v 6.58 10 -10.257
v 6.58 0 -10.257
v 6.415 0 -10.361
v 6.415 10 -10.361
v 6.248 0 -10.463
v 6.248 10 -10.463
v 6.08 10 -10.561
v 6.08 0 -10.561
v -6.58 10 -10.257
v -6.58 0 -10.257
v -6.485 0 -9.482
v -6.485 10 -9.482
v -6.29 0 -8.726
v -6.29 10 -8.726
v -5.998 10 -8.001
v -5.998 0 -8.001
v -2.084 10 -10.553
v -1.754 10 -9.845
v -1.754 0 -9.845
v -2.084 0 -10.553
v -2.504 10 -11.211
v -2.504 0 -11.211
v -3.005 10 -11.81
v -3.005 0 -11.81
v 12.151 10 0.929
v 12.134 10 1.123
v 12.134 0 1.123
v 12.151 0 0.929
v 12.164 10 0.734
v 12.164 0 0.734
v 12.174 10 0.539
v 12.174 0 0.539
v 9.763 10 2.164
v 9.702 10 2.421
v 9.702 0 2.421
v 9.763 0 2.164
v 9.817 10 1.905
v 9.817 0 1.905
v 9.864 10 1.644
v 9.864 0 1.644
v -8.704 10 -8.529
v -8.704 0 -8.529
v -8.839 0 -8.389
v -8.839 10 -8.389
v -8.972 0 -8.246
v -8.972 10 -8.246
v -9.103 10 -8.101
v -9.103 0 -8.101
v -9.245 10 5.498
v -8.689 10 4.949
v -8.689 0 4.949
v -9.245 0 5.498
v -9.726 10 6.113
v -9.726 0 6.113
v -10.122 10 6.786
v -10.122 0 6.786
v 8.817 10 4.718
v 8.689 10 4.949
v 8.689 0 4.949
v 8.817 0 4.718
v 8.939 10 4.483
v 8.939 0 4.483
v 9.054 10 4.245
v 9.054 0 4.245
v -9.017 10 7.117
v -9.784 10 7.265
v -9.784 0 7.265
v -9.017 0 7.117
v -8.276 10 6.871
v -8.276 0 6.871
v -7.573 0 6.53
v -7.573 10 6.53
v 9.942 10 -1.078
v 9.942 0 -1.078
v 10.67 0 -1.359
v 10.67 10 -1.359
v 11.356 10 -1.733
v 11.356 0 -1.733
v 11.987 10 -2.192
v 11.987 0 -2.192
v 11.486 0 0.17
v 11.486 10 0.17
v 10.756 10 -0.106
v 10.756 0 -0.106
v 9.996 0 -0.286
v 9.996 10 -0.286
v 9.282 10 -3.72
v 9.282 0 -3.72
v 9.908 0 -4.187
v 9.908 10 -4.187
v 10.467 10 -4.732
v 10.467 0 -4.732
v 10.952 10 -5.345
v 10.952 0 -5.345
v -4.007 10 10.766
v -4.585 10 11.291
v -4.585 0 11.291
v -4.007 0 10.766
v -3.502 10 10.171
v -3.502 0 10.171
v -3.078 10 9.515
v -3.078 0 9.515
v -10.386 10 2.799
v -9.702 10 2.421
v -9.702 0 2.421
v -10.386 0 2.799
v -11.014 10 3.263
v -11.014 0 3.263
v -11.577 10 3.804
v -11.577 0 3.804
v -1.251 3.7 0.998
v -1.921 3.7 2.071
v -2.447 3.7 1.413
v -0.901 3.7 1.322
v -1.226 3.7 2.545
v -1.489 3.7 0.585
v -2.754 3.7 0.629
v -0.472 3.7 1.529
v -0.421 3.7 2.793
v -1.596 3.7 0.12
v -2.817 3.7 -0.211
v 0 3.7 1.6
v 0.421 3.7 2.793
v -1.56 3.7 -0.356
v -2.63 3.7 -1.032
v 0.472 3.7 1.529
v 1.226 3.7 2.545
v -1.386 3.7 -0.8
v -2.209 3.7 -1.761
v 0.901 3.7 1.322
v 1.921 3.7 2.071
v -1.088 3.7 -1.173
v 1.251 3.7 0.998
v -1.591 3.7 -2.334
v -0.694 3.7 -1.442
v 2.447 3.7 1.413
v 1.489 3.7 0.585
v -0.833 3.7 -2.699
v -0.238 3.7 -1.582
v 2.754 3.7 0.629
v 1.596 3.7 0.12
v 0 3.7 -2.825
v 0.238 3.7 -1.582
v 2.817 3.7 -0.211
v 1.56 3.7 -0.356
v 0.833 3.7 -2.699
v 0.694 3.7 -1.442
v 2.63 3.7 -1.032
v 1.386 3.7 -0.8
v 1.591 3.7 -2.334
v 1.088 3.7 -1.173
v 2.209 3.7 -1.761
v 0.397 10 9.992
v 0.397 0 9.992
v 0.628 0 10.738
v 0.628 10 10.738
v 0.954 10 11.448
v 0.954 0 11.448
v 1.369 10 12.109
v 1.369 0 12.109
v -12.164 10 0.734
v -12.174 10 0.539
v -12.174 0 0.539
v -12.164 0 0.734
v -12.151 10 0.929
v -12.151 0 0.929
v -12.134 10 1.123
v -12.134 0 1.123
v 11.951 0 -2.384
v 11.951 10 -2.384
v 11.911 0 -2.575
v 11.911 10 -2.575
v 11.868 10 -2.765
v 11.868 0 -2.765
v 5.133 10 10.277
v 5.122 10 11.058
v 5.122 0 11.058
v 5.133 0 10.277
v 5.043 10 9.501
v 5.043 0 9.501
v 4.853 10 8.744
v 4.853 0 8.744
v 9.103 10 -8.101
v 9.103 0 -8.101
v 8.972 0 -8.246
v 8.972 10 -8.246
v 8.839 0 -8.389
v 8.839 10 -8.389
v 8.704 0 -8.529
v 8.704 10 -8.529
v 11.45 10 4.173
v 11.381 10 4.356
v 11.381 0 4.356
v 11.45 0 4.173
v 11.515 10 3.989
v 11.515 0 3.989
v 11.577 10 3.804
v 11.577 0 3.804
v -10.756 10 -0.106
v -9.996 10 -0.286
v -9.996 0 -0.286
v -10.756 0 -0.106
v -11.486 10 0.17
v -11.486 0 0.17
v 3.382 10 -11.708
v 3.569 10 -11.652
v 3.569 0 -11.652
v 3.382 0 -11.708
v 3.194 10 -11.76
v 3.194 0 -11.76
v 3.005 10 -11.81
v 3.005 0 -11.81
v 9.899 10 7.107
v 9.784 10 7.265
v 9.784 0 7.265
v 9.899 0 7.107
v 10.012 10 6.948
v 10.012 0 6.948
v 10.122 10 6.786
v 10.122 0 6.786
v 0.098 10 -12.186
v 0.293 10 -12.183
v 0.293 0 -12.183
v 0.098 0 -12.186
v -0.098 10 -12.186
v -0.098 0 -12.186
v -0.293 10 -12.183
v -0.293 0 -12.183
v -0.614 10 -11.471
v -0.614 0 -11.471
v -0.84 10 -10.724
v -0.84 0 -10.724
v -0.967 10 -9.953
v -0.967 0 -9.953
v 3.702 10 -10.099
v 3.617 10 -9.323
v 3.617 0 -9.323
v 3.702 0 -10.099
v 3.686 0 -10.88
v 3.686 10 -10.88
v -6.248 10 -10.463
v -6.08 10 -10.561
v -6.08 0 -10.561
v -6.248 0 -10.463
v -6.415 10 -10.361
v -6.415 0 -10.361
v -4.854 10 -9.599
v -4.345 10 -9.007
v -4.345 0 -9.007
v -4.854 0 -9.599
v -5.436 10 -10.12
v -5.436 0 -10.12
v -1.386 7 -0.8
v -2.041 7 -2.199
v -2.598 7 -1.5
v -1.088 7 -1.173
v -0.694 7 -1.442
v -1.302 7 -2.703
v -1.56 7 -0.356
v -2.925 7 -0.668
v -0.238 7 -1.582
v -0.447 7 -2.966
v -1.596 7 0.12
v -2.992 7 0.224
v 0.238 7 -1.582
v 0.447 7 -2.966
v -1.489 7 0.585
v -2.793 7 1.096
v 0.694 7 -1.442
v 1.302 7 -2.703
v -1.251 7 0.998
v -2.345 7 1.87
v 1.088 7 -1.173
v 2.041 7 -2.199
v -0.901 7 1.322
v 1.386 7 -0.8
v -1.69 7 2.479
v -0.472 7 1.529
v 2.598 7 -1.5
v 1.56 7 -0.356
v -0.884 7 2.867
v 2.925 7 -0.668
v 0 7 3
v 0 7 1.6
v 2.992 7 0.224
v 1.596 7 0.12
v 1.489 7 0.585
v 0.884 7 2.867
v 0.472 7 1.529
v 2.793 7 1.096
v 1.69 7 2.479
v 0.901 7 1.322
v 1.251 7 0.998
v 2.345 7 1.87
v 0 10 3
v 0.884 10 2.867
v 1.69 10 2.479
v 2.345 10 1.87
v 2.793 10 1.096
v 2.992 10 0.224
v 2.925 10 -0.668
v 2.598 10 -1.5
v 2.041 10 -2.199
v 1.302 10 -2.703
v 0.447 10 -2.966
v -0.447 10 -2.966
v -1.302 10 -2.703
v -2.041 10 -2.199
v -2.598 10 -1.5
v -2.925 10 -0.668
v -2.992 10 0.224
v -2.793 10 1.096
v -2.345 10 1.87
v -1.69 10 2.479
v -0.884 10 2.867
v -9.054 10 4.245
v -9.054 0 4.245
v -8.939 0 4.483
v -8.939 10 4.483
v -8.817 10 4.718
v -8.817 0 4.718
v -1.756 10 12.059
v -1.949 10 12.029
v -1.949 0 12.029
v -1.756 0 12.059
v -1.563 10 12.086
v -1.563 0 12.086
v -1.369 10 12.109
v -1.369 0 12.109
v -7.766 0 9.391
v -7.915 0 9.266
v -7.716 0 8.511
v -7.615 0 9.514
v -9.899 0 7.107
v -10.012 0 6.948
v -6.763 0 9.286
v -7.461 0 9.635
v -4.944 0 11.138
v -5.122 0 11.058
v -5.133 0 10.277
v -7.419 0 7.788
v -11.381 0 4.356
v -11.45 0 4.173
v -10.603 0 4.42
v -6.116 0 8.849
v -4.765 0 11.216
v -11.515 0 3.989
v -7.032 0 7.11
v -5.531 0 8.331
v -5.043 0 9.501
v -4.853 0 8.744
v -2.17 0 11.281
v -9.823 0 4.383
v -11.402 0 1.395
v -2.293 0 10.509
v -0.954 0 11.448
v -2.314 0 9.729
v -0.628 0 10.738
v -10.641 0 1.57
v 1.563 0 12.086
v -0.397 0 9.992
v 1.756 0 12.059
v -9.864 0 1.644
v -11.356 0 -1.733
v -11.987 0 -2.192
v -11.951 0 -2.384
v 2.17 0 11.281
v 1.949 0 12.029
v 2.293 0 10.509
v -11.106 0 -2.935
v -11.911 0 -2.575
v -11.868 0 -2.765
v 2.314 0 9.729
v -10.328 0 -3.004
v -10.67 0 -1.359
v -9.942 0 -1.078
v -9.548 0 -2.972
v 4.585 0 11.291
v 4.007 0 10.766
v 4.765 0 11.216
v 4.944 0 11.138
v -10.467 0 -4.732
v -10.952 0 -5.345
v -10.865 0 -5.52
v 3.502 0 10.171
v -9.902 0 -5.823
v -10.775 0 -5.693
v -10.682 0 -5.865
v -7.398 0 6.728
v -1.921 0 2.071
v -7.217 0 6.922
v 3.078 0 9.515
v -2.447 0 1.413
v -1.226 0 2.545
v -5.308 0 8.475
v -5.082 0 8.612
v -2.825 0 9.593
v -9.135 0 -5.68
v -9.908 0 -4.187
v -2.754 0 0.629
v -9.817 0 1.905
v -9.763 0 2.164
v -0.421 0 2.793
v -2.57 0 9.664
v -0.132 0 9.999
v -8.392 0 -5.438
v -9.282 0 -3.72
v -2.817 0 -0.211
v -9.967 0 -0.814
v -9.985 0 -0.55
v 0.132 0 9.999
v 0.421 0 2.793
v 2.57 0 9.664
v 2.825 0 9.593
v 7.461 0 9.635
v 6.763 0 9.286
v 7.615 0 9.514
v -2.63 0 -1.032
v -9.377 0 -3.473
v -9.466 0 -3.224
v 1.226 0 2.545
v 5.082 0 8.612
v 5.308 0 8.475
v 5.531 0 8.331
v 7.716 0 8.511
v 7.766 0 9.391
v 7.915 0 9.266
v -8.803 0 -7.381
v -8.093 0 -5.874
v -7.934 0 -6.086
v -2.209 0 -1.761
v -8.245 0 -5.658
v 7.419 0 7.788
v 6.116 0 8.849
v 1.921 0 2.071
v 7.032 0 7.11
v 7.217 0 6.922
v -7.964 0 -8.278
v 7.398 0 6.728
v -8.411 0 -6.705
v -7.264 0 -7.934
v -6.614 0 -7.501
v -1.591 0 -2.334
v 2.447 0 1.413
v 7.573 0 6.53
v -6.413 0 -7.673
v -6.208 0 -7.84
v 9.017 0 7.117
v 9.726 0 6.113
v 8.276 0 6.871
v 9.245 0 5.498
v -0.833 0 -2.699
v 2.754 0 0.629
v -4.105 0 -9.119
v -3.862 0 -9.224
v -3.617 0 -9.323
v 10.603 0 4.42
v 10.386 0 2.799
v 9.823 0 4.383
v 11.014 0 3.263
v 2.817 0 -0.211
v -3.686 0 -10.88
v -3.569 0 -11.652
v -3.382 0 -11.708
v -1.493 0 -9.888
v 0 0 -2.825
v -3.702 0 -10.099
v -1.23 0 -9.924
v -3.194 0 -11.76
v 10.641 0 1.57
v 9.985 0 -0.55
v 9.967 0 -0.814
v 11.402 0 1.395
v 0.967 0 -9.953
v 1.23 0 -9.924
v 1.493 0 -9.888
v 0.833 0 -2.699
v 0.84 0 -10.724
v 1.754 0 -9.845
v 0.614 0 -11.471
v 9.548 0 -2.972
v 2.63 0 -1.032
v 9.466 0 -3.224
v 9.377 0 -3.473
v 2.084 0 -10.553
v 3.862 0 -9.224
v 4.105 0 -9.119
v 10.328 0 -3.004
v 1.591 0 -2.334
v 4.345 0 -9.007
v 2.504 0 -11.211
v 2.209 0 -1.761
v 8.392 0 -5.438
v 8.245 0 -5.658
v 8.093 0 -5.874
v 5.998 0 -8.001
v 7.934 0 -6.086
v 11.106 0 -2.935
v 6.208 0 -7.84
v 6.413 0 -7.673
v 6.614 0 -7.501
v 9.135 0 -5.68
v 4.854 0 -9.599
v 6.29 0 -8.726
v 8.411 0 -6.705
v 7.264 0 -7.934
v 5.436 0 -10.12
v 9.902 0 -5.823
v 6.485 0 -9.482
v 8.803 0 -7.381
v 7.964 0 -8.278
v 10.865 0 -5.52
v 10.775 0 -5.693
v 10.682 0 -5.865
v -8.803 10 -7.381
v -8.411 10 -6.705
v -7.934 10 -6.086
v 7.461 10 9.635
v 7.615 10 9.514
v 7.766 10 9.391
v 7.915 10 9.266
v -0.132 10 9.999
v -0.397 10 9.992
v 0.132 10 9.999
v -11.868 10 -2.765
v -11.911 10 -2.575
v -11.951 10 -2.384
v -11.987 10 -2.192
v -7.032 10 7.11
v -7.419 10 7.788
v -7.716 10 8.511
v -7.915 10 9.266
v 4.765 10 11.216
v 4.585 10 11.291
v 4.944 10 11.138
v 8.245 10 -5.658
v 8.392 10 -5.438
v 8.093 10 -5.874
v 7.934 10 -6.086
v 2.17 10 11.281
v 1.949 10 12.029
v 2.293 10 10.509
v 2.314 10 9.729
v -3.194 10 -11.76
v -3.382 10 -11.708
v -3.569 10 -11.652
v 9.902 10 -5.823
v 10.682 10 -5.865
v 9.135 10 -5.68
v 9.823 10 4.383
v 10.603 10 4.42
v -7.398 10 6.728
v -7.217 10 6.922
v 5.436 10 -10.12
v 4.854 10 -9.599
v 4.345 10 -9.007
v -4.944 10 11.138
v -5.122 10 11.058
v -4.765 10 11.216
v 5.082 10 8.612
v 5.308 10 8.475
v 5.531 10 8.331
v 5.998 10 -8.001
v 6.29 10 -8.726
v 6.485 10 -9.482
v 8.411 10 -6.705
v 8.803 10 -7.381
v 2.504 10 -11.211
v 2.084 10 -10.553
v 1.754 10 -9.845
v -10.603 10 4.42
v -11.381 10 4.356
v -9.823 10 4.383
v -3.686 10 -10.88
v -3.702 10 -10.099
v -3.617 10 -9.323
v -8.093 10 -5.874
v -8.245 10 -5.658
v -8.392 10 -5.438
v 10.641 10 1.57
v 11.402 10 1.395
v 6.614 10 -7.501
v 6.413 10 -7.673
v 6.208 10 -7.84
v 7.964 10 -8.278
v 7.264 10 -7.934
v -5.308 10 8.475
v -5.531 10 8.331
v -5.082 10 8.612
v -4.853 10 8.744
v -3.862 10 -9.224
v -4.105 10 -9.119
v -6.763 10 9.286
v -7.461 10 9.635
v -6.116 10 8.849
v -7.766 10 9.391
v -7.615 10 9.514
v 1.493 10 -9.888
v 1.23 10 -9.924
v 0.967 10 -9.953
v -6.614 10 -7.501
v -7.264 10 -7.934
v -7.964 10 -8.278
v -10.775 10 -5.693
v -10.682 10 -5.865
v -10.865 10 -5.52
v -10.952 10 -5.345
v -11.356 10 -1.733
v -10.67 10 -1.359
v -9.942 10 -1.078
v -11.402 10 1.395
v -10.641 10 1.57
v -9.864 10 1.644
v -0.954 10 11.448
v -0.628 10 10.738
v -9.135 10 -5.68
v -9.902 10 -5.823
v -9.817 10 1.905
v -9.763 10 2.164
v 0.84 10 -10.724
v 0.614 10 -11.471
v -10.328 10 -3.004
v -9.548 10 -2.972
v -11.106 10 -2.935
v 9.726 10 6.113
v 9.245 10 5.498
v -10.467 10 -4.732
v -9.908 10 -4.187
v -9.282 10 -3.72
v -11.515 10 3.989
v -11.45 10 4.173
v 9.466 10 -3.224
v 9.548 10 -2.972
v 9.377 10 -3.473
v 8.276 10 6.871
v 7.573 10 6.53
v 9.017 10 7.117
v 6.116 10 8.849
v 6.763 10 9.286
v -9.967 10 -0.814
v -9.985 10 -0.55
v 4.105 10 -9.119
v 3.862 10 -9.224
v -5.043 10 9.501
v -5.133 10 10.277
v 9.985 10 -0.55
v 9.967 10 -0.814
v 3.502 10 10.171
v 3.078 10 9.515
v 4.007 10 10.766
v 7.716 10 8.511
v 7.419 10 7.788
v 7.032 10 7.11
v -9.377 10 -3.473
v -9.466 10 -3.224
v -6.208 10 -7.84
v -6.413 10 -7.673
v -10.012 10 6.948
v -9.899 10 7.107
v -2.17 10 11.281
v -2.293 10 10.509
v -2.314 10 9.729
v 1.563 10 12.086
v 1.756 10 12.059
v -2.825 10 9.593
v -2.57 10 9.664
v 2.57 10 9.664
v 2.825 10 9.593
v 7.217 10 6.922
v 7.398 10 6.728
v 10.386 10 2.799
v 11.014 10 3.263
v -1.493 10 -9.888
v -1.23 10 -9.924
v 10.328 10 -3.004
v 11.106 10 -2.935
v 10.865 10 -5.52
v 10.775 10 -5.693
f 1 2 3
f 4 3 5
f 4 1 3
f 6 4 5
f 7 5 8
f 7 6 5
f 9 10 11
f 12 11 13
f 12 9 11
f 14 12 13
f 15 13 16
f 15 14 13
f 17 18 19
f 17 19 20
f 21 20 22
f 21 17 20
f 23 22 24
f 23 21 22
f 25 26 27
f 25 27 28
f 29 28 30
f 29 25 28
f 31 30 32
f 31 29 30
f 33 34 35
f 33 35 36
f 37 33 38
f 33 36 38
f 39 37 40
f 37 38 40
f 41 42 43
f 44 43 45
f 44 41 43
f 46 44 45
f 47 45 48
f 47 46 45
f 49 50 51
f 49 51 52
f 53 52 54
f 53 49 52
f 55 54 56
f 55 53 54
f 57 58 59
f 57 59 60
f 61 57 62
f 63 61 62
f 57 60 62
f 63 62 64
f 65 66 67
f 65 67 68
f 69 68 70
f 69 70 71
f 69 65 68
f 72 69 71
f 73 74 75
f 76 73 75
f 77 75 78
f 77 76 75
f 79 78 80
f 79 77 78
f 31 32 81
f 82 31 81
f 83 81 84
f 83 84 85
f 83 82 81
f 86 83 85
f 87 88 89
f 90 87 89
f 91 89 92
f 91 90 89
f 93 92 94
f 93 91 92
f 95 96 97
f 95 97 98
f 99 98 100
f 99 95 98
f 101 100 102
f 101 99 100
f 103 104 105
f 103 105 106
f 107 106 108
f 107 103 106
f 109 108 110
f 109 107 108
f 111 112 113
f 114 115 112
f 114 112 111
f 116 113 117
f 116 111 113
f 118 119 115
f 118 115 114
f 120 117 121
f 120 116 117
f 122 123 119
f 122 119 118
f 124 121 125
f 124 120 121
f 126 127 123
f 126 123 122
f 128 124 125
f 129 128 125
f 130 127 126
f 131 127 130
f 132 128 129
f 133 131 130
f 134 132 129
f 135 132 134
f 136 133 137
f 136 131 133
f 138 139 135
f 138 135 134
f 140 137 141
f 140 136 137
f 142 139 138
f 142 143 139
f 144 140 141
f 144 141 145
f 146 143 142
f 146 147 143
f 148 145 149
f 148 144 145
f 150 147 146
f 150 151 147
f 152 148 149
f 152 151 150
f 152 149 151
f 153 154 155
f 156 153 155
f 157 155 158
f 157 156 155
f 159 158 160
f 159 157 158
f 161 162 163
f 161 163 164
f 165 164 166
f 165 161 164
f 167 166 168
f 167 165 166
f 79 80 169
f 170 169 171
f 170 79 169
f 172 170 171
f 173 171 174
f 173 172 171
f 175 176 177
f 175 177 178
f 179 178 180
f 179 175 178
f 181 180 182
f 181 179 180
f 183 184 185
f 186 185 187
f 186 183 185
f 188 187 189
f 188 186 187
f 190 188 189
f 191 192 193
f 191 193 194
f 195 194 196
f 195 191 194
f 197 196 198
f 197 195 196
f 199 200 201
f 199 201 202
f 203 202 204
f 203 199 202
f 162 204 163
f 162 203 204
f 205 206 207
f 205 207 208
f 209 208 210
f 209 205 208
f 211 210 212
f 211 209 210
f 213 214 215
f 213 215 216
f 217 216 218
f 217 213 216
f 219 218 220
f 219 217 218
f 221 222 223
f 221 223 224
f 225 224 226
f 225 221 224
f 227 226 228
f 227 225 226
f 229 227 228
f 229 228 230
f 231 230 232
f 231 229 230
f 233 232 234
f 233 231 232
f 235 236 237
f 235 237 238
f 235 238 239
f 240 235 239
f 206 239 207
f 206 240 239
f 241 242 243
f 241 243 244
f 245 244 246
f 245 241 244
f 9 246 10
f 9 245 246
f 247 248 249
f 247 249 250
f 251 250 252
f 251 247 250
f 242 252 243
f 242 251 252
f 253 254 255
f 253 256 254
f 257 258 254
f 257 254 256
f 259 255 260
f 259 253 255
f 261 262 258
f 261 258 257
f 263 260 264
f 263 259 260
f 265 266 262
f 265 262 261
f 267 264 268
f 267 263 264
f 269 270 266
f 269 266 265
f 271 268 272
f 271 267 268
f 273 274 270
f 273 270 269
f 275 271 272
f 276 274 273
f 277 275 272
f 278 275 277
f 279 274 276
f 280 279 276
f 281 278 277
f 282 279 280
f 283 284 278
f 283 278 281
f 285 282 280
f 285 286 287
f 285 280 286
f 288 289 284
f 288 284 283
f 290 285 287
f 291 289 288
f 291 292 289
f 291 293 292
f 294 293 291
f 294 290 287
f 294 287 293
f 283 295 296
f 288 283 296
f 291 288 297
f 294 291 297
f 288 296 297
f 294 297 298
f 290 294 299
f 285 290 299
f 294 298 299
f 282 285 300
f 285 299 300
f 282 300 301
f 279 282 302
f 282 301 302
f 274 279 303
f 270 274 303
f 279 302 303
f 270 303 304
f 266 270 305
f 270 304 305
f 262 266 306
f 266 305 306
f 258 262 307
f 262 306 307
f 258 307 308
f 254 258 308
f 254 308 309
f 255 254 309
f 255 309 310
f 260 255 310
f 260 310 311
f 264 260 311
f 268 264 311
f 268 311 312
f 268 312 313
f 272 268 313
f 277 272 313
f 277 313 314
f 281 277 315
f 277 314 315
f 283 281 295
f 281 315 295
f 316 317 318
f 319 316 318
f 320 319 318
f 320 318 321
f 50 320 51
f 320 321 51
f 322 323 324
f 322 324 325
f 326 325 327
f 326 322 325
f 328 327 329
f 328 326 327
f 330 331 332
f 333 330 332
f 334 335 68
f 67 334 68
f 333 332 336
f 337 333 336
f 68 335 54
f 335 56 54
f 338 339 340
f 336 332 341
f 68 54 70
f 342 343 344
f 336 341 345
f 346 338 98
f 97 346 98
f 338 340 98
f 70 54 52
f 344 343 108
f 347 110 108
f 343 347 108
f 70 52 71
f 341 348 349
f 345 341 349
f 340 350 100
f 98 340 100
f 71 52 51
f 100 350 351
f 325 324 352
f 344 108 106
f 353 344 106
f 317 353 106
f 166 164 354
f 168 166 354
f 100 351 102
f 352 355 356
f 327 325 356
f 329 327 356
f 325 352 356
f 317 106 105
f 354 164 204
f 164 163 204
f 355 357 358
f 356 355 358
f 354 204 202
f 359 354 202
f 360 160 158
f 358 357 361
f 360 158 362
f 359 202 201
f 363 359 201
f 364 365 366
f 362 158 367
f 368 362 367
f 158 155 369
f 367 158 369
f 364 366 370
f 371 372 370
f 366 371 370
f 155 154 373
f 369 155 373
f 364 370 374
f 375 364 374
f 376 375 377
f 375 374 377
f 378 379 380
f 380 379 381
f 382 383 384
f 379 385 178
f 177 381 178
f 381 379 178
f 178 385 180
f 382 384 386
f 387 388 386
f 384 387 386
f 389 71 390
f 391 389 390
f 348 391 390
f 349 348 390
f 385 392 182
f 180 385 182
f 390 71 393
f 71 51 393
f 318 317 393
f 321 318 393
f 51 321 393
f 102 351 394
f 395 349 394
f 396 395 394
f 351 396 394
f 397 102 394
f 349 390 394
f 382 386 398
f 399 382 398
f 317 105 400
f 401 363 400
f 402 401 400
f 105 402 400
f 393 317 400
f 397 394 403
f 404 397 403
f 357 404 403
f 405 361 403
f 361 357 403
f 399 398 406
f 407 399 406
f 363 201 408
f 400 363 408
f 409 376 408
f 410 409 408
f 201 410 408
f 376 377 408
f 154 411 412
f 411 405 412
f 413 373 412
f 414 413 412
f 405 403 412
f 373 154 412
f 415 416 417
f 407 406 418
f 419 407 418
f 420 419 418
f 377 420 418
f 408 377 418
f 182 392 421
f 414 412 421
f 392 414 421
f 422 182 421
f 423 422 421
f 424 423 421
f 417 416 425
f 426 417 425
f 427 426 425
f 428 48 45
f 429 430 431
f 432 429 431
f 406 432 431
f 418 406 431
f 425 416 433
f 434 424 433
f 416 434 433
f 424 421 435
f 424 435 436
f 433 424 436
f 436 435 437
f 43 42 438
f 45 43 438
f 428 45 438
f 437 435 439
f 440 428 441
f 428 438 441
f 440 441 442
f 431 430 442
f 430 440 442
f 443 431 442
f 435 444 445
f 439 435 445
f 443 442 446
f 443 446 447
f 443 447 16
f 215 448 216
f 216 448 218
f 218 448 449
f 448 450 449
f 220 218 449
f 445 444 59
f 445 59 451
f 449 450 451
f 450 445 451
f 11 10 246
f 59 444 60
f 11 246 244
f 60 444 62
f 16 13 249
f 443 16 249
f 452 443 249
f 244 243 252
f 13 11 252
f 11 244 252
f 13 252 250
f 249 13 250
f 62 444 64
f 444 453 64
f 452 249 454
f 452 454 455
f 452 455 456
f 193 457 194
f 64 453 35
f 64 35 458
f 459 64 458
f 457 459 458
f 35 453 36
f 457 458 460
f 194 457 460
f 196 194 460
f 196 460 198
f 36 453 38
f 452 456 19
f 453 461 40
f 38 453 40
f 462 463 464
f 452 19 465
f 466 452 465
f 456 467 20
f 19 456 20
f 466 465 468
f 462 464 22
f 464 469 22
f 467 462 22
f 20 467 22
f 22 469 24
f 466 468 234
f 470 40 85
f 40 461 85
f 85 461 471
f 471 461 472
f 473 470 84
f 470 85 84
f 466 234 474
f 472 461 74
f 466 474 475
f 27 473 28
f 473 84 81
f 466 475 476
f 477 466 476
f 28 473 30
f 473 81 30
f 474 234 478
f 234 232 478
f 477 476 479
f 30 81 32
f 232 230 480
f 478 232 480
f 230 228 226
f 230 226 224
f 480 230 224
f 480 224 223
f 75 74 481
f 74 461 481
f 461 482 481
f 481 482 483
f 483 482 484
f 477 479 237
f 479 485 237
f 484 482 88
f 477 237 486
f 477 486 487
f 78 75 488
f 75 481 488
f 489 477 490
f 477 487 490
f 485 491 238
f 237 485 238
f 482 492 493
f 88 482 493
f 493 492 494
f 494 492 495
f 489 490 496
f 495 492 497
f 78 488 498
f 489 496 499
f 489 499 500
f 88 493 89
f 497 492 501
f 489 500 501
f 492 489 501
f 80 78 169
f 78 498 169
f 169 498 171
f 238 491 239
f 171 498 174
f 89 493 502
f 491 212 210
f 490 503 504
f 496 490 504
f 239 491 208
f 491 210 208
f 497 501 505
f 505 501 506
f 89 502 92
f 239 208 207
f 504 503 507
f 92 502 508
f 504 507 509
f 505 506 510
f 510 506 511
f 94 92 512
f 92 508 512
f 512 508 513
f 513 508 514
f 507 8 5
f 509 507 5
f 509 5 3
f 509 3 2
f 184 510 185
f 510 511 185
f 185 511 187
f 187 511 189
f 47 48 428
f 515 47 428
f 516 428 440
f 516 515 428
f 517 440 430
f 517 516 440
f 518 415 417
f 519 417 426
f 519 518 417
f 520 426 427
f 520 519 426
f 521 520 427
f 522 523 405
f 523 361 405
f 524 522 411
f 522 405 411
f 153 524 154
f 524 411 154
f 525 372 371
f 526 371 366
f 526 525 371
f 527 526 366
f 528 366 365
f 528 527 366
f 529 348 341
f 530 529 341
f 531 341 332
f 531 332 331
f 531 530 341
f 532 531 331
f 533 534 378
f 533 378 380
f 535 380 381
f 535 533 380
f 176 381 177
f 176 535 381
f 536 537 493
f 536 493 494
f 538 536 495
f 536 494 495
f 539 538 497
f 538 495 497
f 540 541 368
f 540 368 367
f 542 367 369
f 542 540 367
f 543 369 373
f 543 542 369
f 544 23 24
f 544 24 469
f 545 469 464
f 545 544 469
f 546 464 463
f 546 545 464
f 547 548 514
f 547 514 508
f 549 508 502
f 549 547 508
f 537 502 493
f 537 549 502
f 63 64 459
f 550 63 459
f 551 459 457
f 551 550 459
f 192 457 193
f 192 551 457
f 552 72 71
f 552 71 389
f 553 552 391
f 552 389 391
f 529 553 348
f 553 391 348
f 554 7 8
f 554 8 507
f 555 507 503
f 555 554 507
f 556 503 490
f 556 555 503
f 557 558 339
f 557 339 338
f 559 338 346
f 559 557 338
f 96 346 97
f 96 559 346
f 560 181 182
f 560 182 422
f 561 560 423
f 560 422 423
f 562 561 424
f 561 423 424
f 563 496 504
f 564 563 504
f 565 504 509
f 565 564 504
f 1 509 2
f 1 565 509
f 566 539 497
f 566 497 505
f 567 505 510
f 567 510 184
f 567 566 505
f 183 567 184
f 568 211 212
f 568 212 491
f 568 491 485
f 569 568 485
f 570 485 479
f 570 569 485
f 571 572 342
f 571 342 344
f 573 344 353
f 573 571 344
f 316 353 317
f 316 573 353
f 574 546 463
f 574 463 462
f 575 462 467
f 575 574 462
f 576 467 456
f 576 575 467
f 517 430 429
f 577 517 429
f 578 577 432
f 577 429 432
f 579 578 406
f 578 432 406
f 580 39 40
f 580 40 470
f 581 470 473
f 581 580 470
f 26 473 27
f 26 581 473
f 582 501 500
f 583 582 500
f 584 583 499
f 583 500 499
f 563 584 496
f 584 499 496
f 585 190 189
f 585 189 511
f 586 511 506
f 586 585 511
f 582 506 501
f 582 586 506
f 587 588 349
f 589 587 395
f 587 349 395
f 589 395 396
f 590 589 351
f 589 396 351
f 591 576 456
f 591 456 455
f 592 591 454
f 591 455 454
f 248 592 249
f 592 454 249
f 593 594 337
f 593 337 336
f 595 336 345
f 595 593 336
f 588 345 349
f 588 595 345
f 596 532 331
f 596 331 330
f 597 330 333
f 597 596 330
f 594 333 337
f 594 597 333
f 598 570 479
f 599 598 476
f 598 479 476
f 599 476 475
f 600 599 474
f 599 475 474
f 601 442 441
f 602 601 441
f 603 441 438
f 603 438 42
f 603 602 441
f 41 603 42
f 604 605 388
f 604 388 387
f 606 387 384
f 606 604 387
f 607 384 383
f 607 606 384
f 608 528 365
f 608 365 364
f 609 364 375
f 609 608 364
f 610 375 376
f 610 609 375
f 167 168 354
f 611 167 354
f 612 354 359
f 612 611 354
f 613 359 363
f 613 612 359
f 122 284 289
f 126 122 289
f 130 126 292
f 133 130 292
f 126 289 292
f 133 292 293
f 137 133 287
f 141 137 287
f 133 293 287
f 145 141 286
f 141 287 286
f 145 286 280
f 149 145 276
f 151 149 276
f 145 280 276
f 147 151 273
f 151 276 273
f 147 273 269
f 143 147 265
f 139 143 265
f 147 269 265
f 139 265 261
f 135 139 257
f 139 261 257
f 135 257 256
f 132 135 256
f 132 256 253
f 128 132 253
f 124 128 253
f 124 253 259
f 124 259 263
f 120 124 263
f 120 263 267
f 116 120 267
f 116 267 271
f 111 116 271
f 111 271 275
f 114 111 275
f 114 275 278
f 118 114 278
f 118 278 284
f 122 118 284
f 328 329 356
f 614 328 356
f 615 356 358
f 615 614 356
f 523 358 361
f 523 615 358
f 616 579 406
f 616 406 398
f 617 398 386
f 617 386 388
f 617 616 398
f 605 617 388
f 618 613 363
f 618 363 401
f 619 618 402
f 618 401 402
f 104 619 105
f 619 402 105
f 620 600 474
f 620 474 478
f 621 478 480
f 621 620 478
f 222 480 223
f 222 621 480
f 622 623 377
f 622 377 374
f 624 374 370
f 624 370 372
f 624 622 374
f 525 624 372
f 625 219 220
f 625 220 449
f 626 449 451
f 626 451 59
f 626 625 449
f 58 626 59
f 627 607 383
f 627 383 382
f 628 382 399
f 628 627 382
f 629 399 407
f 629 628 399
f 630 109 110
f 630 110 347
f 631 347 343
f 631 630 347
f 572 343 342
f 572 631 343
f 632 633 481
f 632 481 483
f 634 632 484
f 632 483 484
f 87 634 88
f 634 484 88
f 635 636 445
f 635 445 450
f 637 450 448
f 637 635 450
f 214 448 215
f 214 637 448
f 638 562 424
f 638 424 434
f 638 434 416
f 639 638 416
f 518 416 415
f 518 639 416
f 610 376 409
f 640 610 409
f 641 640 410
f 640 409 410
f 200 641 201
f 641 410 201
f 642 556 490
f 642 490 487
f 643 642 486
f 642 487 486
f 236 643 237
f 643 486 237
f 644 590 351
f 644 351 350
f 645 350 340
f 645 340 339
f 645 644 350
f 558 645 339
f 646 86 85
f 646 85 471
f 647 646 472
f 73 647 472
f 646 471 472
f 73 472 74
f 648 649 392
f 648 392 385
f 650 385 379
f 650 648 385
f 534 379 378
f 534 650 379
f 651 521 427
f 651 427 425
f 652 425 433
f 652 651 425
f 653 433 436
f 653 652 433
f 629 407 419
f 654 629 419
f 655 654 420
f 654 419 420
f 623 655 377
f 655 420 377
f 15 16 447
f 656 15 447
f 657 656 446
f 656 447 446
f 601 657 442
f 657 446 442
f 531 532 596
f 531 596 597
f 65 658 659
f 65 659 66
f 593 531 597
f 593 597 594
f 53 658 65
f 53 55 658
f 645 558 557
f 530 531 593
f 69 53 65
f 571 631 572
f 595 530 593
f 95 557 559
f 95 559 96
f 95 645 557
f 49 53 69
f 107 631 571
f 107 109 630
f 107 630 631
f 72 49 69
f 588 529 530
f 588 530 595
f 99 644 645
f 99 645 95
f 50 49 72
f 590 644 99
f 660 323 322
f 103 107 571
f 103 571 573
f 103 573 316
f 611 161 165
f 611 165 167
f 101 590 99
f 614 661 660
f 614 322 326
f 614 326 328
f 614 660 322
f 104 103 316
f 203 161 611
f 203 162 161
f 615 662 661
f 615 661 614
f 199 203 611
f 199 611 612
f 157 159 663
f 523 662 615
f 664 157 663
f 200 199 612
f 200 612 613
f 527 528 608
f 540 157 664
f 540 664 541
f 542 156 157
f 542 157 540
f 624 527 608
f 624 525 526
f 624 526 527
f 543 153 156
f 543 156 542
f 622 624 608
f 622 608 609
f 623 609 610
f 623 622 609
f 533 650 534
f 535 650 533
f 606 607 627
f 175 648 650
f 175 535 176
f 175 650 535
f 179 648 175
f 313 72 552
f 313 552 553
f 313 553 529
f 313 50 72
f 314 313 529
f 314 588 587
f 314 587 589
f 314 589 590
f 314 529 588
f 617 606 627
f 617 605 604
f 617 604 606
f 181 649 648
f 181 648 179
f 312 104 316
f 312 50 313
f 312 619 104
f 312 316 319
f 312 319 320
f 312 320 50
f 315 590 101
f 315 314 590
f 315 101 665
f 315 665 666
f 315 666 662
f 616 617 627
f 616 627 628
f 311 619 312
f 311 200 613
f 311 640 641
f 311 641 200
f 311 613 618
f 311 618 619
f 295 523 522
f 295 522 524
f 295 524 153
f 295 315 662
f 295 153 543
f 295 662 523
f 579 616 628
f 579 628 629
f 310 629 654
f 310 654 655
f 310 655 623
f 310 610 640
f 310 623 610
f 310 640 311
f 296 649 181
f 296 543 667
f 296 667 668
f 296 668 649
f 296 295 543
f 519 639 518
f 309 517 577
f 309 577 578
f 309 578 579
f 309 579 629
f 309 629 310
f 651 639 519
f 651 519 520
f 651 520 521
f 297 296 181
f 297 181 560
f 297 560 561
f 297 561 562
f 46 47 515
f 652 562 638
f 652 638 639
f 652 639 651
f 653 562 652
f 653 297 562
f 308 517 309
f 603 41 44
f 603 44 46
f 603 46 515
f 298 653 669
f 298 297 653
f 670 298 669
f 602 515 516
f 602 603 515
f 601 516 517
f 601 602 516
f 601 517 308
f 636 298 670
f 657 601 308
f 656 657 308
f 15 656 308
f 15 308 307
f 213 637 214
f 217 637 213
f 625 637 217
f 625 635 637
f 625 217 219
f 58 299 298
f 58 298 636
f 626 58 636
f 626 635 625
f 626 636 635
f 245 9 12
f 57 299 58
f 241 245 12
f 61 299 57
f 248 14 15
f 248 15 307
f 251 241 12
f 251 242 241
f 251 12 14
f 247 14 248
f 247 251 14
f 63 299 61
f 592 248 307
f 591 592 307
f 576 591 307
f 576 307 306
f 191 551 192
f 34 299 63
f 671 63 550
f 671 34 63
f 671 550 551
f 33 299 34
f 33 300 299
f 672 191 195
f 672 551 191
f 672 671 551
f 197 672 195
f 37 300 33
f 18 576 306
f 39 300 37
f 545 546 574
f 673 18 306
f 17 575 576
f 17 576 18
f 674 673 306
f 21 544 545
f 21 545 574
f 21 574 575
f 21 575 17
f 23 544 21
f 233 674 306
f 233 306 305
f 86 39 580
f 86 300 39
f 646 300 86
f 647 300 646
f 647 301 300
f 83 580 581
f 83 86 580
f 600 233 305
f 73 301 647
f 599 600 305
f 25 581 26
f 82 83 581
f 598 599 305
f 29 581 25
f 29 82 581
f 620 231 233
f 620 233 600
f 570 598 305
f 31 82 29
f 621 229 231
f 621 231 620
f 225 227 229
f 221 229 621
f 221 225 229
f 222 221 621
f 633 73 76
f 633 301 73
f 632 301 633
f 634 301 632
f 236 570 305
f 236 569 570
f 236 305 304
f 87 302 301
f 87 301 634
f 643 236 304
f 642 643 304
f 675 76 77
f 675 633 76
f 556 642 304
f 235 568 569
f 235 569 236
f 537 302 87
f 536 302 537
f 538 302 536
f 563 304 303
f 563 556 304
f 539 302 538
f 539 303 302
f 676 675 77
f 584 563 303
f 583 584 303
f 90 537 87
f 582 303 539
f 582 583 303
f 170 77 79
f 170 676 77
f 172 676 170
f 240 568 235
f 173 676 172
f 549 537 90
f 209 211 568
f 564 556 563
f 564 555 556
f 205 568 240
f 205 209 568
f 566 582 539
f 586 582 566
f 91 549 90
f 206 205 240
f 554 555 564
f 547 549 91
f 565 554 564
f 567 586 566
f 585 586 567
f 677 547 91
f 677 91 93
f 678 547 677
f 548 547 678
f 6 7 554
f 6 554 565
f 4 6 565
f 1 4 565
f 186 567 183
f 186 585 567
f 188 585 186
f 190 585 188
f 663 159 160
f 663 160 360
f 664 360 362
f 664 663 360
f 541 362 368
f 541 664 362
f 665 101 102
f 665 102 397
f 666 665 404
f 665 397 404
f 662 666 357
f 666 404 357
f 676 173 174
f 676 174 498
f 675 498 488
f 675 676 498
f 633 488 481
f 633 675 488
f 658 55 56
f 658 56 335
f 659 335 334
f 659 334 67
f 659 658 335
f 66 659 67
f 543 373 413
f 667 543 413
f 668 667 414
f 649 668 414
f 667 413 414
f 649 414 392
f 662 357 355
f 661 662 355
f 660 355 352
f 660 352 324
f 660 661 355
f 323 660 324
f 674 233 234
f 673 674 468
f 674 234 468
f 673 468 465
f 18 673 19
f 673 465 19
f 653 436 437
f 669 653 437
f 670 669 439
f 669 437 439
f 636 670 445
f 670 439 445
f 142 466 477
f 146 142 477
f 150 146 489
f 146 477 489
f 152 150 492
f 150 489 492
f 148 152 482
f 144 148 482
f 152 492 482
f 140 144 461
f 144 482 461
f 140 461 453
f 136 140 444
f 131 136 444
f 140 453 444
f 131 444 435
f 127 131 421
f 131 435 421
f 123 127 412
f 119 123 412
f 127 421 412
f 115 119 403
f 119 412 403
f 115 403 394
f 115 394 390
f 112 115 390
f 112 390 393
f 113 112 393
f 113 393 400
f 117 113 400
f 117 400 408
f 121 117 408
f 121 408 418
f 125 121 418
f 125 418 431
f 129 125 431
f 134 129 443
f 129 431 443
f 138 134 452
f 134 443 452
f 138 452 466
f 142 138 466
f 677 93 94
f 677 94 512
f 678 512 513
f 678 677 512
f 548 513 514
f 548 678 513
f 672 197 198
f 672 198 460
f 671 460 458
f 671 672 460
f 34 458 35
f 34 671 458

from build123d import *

# Parameters (mm, degrees)
SKETCH1_R           = 10
BOSS_EXTRUDE1_DEPTH = 10
BOSS_EXTRUDE2_DEPTH = 10
SKETCH4_R           = 2.825
CUT_EXTRUDE1_DEPTH  = 3.7
SKETCH5_R           = 1.6
CUT_EXTRUDE2_DEPTH  = 20.917820636
SKETCH7_R           = 3
CUT_EXTRUDE3_DEPTH  = 3


with BuildPart() as part:
    # Sketch1 → Boss-Extrude1 (new body)
    with BuildSketch(Plane(origin=(0, 0, 0), x_dir=(1, 0, 0), z_dir=(0, 1, 0))):
        with Locations(Location((0, 0, 0), (0, 0, 270))):
            Circle(SKETCH1_R)
    extrude(amount=BOSS_EXTRUDE1_DEPTH)

    # Sketch3 → Boss-Extrude2 (add)
    with BuildSketch(Plane(origin=(0, 10, 0), x_dir=(1, 0, 0), z_dir=(0, 1, 0))):
        with BuildLine():
            ThreePointArc((-0.292653692, 12.182759316), (-0.746983902, 11.075453202), (-0.972488982, 9.9))
            ThreePointArc((-0.972488982, 9.9), (0, 9.947649713), (0.972488982, 9.9))
            ThreePointArc((0.972488982, 9.9), (0.746983902, 11.075453202), (0.292653692, 12.182759316))
            ThreePointArc((0.292653692, 12.182759316), (0, 12.186273866), (-0.292653692, 12.182759316))
        make_face()
        with BuildLine():
            ThreePointArc((3.005067828, 11.809946574), (2.2688378, 10.866279198), (1.734561582, 9.795255532))
            ThreePointArc((1.734561582, 9.795255532), (2.683843773, 9.578763877), (3.607414487, 9.270506757))
            ThreePointArc((3.607414487, 9.270506757), (3.707405226, 10.463211508), (3.568670426, 11.652032532))
            ThreePointArc((3.568670426, 11.652032532), (3.287817341, 11.734373774), (3.005067828, 11.809946574))
        make_face()
        with BuildLine():
            ThreePointArc((6.079917215, 10.561244121), (5.116390182, 9.851202976), (4.312967649, 8.964041772))
            ThreePointArc((4.312967649, 8.964041772), (5.168639132, 8.499464945), (5.974794562, 7.953462438))
            ThreePointArc((5.974794562, 7.953462438), (6.392865264, 9.074961283), (6.580015201, 10.257127799))
            ThreePointArc((6.580015201, 10.257127799), (6.331792311, 10.41218886), (6.079917215, 10.561244121))
        make_face()
        with BuildLine():
            ThreePointArc((8.703846955, 8.529262507), (7.58448331, 8.105508096), (6.571500635, 7.468006041))
            ThreePointArc((6.571500635, 7.468006041), (7.270100171, 6.789799579), (7.899051458, 6.046546195))
            ThreePointArc((7.899051458, 6.046546195), (8.604195731, 7.013662695), (9.103350349, 8.101498821))
            ThreePointArc((9.103350349, 8.101498821), (8.906167212, 8.317779531), (8.703846955, 8.529262507))
        make_face()
        with BuildLine():
            ThreePointArc((10.682252184, 5.864704511), (9.490070008, 5.758664761), (8.342655482, 5.418102466))
            ThreePointArc((8.342655482, 5.418102466), (8.832371138, 4.576565841), (9.237471842, 3.691185281))
            ThreePointArc((9.237471842, 3.691185281), (10.177392362, 4.43219283), (10.951531647, 5.345018737))
            ThreePointArc((10.951531647, 5.345018737), (10.820012433, 5.606478546), (10.682252184, 5.864704511))
        make_face()
        with BuildLine():
            ThreePointArc((11.868403637, 2.765188211), (10.691821627, 2.984727604), (9.495073737, 2.966363017))
            ThreePointArc((9.495073737, 2.966363017), (9.739585544, 2.02390915), (9.890791199, 1.062066042))
            ThreePointArc((9.890791199, 1.062066042), (10.99577836, 1.522007499), (11.987487943, 2.192123066))
            ThreePointArc((11.987487943, 2.192123066), (11.93138683, 2.479370695), (11.868403637, 2.765188211))
        make_face()
        with BuildLine():
            ThreePointArc((12.174329886, -0.539409449), (11.100609748, -0.010573145), (9.94328581, 0.294621993))
            ThreePointArc((9.94328581, 0.294621993), (9.924459446, -0.678851624), (9.81055582, -1.645821778))
            ThreePointArc((9.81055582, -1.645821778), (10.99865778, -1.501058166), (12.134387098, -1.123352345))
            ThreePointArc((12.134387098, -1.123352345), (12.157864849, -0.831620739), (12.174329886, -0.539409449))
        make_face()
        with BuildLine():
            ThreePointArc((11.577341782, -3.804001578), (10.686116426, -3.005089732), (9.654049862, -2.398969796))
            ThreePointArc((9.654049862, -2.398969796), (9.373281592, -3.331265078), (9.002716396, -4.231646525))
            ThreePointArc((9.002716396, -4.231646525), (10.185817067, -4.412797214), (11.381334272, -4.355513852))
            ThreePointArc((11.381334272, -4.355513852), (11.48264965, -4.080934666), (11.577341782, -3.804001578))
        make_face()
        with BuildLine():
            ThreePointArc((10.1217152, -6.786468311), (9.479082735, -5.776732561), (8.6488172, -4.914640969))
            ThreePointArc((8.6488172, -4.914640969), (8.126930322, -5.736613841), (7.527186681, -6.503629408))
            ThreePointArc((7.527186681, -6.503629408), (8.6175409, -6.997259279), (9.78417995, -7.264646822))
            ThreePointArc((9.78417995, -7.264646822), (9.955818856, -7.027584338), (10.1217152, -6.786468311))
        make_face()
        with BuildLine():
            ThreePointArc((7.915407306, -9.265613737), (7.569028841, -8.119941563), (7.002141332, -7.065815706))
            ThreePointArc((7.002141332, -7.065815706), (6.277841808, -7.716504199), (5.493399966, -8.29326785))
            ThreePointArc((5.493399966, -8.29326785), (6.410141146, -9.062766634), (7.46137776, -9.63499417))
            ThreePointArc((7.46137776, -9.63499417), (7.690610523, -9.453030229), (7.915407306, -9.265613737))
        make_face()
        with BuildLine():
            ThreePointArc((5.122049862, -11.057570978), (5.097614704, -9.860931645), (4.836148674, -8.692951215))
            ThreePointArc((4.836148674, -8.692951215), (3.963154487, -9.124096741), (3.052192905, -9.467832555))
            ThreePointArc((3.052192905, -9.467832555), (3.727330549, -10.456130047), (4.585199315, -11.290758078))
            ThreePointArc((4.585199315, -11.290758078), (4.855024789, -11.177388113), (5.122049862, -11.057570978))
        make_face()
        with BuildLine():
            ThreePointArc((1.948813412, -12.029438766), (2.248133804, -10.870581538), (2.311480993, -9.6753703))
            ThreePointArc((2.311480993, -9.6753703), (1.354538128, -9.854996767), (0.384618659, -9.940211432))
            ThreePointArc((0.384618659, -9.940211432), (0.768080896, -11.074010128), (1.368957613, -12.109138111))
            ThreePointArc((1.368957613, -12.109138111), (1.659364077, -12.072770253), (1.948813412, -12.029438766))
        make_face()
        with BuildLine():
            ThreePointArc((-1.368957613, -12.109138111), (-0.768080896, -11.074010128), (-0.384618659, -9.940211432))
            ThreePointArc((-0.384618659, -9.940211432), (-1.354538128, -9.854996767), (-2.311480993, -9.6753703))
            ThreePointArc((-2.311480993, -9.6753703), (-2.248133804, -10.870581538), (-1.948813412, -12.029438766))
            ThreePointArc((-1.948813412, -12.029438766), (-1.659364077, -12.072770253), (-1.368957613, -12.109138111))
        make_face()
        with BuildLine():
            ThreePointArc((-4.585199315, -11.290758078), (-3.727330549, -10.456130047), (-3.052192905, -9.467832555))
            ThreePointArc((-3.052192905, -9.467832555), (-3.963154487, -9.124096741), (-4.836148674, -8.692951215))
            ThreePointArc((-4.836148674, -8.692951215), (-5.097614704, -9.860931645), (-5.122049862, -11.057570978))
            ThreePointArc((-5.122049862, -11.057570978), (-4.855024789, -11.177388113), (-4.585199315, -11.290758078))
        make_face()
        with BuildLine():
            ThreePointArc((-7.46137776, -9.63499417), (-6.410141146, -9.062766634), (-5.493399966, -8.29326785))
            ThreePointArc((-5.493399966, -8.29326785), (-6.277841808, -7.716504199), (-7.002141332, -7.065815706))
            ThreePointArc((-7.002141332, -7.065815706), (-7.569028841, -8.119941563), (-7.915407306, -9.265613737))
            ThreePointArc((-7.915407306, -9.265613737), (-7.690610523, -9.453030229), (-7.46137776, -9.63499417))
        make_face()
        with BuildLine():
            ThreePointArc((-9.78417995, -7.264646822), (-8.6175409, -6.997259279), (-7.527186681, -6.503629408))
            ThreePointArc((-7.527186681, -6.503629408), (-8.126930322, -5.736613841), (-8.6488172, -4.914640969))
            ThreePointArc((-8.6488172, -4.914640969), (-9.479082735, -5.776732561), (-10.1217152, -6.786468311))
            ThreePointArc((-10.1217152, -6.786468311), (-9.955818856, -7.027584338), (-9.78417995, -7.264646822))
        make_face()
        with BuildLine():
            ThreePointArc((-11.381334272, -4.355513852), (-10.185817067, -4.412797214), (-9.002716396, -4.231646525))
            ThreePointArc((-9.002716396, -4.231646525), (-9.373281592, -3.331265078), (-9.654049862, -2.398969796))
            ThreePointArc((-9.654049862, -2.398969796), (-10.686116426, -3.005089732), (-11.577341782, -3.804001578))
            ThreePointArc((-11.577341782, -3.804001578), (-11.48264965, -4.080934666), (-11.381334272, -4.355513852))
        make_face()
        with BuildLine():
            ThreePointArc((-12.134387098, -1.123352345), (-10.99865778, -1.501058166), (-9.81055582, -1.645821778))
            ThreePointArc((-9.81055582, -1.645821778), (-9.924459446, -0.678851624), (-9.94328581, 0.294621993))
            ThreePointArc((-9.94328581, 0.294621993), (-11.100609748, -0.010573145), (-12.174329886, -0.539409449))
            ThreePointArc((-12.174329886, -0.539409449), (-12.157864849, -0.831620739), (-12.134387098, -1.123352345))
        make_face()
        with BuildLine():
            ThreePointArc((-11.987487943, 2.192123066), (-10.99577836, 1.522007499), (-9.890791199, 1.062066042))
            ThreePointArc((-9.890791199, 1.062066042), (-9.739585544, 2.02390915), (-9.495073737, 2.966363017))
            ThreePointArc((-9.495073737, 2.966363017), (-10.691821627, 2.984727604), (-11.868403637, 2.765188211))
            ThreePointArc((-11.868403637, 2.765188211), (-11.93138683, 2.479370695), (-11.987487943, 2.192123066))
        make_face()
        with BuildLine():
            ThreePointArc((-10.951531647, 5.345018737), (-10.177392362, 4.43219283), (-9.237471842, 3.691185281))
            ThreePointArc((-9.237471842, 3.691185281), (-8.832371138, 4.576565841), (-8.342655482, 5.418102466))
            ThreePointArc((-8.342655482, 5.418102466), (-9.490070008, 5.758664761), (-10.682252184, 5.864704511))
            ThreePointArc((-10.682252184, 5.864704511), (-10.820012433, 5.606478546), (-10.951531647, 5.345018737))
        make_face()
        with BuildLine():
            ThreePointArc((-9.103350349, 8.101498821), (-8.604195731, 7.013662695), (-7.899051458, 6.046546195))
            ThreePointArc((-7.899051458, 6.046546195), (-7.270100171, 6.789799579), (-6.571500635, 7.468006041))
            ThreePointArc((-6.571500635, 7.468006041), (-7.58448331, 8.105508096), (-8.703846955, 8.529262507))
            ThreePointArc((-8.703846955, 8.529262507), (-8.906167212, 8.317779531), (-9.103350349, 8.101498821))
        make_face()
        with BuildLine():
            ThreePointArc((-6.580015201, 10.257127799), (-6.392865264, 9.074961283), (-5.974794562, 7.953462438))
            ThreePointArc((-5.974794562, 7.953462438), (-5.168639132, 8.499464945), (-4.312967649, 8.964041772))
            ThreePointArc((-4.312967649, 8.964041772), (-5.116390182, 9.851202976), (-6.079917215, 10.561244121))
            ThreePointArc((-6.079917215, 10.561244121), (-6.331792311, 10.41218886), (-6.580015201, 10.257127799))
        make_face()
        with BuildLine():
            ThreePointArc((-3.568670426, 11.652032532), (-3.707405226, 10.463211508), (-3.607414487, 9.270506757))
            ThreePointArc((-3.607414487, 9.270506757), (-2.683843773, 9.578763877), (-1.734561582, 9.795255532))
            ThreePointArc((-1.734561582, 9.795255532), (-2.2688378, 10.866279198), (-3.005067828, 11.809946574))
            ThreePointArc((-3.005067828, 11.809946574), (-3.287817341, 11.734373774), (-3.568670426, 11.652032532))
        make_face()
    extrude(amount=-BOSS_EXTRUDE2_DEPTH)

    # Sketch4 → Cut-Extrude1 (cut)
    with BuildSketch(Plane.XZ):
        with Locations(Location((0, 0, 0), (0, 0, 270))):
            Circle(SKETCH4_R)
    extrude(amount=-CUT_EXTRUDE1_DEPTH, mode=Mode.SUBTRACT)

    # Sketch5 → Cut-Extrude2 (cut, through all)
    with BuildSketch(Plane(origin=(0, 10, 0), x_dir=(1, 0, 0), z_dir=(0, 1, 0))):
        with Locations(Location((0, 0, 0), (0, 0, 270))):
            Circle(SKETCH5_R)
    extrude(amount=-CUT_EXTRUDE2_DEPTH, mode=Mode.SUBTRACT)

    # Sketch7 → Cut-Extrude3 (cut)
    with BuildSketch(Plane(origin=(0, 10, 0), x_dir=(1, 0, 0), z_dir=(0, 1, 0))):
        with Locations(Location((0, 0, 0), (0, 0, 270))):
            Circle(SKETCH7_R)
    extrude(amount=-CUT_EXTRUDE3_DEPTH, mode=Mode.SUBTRACT)


solid = part.part
